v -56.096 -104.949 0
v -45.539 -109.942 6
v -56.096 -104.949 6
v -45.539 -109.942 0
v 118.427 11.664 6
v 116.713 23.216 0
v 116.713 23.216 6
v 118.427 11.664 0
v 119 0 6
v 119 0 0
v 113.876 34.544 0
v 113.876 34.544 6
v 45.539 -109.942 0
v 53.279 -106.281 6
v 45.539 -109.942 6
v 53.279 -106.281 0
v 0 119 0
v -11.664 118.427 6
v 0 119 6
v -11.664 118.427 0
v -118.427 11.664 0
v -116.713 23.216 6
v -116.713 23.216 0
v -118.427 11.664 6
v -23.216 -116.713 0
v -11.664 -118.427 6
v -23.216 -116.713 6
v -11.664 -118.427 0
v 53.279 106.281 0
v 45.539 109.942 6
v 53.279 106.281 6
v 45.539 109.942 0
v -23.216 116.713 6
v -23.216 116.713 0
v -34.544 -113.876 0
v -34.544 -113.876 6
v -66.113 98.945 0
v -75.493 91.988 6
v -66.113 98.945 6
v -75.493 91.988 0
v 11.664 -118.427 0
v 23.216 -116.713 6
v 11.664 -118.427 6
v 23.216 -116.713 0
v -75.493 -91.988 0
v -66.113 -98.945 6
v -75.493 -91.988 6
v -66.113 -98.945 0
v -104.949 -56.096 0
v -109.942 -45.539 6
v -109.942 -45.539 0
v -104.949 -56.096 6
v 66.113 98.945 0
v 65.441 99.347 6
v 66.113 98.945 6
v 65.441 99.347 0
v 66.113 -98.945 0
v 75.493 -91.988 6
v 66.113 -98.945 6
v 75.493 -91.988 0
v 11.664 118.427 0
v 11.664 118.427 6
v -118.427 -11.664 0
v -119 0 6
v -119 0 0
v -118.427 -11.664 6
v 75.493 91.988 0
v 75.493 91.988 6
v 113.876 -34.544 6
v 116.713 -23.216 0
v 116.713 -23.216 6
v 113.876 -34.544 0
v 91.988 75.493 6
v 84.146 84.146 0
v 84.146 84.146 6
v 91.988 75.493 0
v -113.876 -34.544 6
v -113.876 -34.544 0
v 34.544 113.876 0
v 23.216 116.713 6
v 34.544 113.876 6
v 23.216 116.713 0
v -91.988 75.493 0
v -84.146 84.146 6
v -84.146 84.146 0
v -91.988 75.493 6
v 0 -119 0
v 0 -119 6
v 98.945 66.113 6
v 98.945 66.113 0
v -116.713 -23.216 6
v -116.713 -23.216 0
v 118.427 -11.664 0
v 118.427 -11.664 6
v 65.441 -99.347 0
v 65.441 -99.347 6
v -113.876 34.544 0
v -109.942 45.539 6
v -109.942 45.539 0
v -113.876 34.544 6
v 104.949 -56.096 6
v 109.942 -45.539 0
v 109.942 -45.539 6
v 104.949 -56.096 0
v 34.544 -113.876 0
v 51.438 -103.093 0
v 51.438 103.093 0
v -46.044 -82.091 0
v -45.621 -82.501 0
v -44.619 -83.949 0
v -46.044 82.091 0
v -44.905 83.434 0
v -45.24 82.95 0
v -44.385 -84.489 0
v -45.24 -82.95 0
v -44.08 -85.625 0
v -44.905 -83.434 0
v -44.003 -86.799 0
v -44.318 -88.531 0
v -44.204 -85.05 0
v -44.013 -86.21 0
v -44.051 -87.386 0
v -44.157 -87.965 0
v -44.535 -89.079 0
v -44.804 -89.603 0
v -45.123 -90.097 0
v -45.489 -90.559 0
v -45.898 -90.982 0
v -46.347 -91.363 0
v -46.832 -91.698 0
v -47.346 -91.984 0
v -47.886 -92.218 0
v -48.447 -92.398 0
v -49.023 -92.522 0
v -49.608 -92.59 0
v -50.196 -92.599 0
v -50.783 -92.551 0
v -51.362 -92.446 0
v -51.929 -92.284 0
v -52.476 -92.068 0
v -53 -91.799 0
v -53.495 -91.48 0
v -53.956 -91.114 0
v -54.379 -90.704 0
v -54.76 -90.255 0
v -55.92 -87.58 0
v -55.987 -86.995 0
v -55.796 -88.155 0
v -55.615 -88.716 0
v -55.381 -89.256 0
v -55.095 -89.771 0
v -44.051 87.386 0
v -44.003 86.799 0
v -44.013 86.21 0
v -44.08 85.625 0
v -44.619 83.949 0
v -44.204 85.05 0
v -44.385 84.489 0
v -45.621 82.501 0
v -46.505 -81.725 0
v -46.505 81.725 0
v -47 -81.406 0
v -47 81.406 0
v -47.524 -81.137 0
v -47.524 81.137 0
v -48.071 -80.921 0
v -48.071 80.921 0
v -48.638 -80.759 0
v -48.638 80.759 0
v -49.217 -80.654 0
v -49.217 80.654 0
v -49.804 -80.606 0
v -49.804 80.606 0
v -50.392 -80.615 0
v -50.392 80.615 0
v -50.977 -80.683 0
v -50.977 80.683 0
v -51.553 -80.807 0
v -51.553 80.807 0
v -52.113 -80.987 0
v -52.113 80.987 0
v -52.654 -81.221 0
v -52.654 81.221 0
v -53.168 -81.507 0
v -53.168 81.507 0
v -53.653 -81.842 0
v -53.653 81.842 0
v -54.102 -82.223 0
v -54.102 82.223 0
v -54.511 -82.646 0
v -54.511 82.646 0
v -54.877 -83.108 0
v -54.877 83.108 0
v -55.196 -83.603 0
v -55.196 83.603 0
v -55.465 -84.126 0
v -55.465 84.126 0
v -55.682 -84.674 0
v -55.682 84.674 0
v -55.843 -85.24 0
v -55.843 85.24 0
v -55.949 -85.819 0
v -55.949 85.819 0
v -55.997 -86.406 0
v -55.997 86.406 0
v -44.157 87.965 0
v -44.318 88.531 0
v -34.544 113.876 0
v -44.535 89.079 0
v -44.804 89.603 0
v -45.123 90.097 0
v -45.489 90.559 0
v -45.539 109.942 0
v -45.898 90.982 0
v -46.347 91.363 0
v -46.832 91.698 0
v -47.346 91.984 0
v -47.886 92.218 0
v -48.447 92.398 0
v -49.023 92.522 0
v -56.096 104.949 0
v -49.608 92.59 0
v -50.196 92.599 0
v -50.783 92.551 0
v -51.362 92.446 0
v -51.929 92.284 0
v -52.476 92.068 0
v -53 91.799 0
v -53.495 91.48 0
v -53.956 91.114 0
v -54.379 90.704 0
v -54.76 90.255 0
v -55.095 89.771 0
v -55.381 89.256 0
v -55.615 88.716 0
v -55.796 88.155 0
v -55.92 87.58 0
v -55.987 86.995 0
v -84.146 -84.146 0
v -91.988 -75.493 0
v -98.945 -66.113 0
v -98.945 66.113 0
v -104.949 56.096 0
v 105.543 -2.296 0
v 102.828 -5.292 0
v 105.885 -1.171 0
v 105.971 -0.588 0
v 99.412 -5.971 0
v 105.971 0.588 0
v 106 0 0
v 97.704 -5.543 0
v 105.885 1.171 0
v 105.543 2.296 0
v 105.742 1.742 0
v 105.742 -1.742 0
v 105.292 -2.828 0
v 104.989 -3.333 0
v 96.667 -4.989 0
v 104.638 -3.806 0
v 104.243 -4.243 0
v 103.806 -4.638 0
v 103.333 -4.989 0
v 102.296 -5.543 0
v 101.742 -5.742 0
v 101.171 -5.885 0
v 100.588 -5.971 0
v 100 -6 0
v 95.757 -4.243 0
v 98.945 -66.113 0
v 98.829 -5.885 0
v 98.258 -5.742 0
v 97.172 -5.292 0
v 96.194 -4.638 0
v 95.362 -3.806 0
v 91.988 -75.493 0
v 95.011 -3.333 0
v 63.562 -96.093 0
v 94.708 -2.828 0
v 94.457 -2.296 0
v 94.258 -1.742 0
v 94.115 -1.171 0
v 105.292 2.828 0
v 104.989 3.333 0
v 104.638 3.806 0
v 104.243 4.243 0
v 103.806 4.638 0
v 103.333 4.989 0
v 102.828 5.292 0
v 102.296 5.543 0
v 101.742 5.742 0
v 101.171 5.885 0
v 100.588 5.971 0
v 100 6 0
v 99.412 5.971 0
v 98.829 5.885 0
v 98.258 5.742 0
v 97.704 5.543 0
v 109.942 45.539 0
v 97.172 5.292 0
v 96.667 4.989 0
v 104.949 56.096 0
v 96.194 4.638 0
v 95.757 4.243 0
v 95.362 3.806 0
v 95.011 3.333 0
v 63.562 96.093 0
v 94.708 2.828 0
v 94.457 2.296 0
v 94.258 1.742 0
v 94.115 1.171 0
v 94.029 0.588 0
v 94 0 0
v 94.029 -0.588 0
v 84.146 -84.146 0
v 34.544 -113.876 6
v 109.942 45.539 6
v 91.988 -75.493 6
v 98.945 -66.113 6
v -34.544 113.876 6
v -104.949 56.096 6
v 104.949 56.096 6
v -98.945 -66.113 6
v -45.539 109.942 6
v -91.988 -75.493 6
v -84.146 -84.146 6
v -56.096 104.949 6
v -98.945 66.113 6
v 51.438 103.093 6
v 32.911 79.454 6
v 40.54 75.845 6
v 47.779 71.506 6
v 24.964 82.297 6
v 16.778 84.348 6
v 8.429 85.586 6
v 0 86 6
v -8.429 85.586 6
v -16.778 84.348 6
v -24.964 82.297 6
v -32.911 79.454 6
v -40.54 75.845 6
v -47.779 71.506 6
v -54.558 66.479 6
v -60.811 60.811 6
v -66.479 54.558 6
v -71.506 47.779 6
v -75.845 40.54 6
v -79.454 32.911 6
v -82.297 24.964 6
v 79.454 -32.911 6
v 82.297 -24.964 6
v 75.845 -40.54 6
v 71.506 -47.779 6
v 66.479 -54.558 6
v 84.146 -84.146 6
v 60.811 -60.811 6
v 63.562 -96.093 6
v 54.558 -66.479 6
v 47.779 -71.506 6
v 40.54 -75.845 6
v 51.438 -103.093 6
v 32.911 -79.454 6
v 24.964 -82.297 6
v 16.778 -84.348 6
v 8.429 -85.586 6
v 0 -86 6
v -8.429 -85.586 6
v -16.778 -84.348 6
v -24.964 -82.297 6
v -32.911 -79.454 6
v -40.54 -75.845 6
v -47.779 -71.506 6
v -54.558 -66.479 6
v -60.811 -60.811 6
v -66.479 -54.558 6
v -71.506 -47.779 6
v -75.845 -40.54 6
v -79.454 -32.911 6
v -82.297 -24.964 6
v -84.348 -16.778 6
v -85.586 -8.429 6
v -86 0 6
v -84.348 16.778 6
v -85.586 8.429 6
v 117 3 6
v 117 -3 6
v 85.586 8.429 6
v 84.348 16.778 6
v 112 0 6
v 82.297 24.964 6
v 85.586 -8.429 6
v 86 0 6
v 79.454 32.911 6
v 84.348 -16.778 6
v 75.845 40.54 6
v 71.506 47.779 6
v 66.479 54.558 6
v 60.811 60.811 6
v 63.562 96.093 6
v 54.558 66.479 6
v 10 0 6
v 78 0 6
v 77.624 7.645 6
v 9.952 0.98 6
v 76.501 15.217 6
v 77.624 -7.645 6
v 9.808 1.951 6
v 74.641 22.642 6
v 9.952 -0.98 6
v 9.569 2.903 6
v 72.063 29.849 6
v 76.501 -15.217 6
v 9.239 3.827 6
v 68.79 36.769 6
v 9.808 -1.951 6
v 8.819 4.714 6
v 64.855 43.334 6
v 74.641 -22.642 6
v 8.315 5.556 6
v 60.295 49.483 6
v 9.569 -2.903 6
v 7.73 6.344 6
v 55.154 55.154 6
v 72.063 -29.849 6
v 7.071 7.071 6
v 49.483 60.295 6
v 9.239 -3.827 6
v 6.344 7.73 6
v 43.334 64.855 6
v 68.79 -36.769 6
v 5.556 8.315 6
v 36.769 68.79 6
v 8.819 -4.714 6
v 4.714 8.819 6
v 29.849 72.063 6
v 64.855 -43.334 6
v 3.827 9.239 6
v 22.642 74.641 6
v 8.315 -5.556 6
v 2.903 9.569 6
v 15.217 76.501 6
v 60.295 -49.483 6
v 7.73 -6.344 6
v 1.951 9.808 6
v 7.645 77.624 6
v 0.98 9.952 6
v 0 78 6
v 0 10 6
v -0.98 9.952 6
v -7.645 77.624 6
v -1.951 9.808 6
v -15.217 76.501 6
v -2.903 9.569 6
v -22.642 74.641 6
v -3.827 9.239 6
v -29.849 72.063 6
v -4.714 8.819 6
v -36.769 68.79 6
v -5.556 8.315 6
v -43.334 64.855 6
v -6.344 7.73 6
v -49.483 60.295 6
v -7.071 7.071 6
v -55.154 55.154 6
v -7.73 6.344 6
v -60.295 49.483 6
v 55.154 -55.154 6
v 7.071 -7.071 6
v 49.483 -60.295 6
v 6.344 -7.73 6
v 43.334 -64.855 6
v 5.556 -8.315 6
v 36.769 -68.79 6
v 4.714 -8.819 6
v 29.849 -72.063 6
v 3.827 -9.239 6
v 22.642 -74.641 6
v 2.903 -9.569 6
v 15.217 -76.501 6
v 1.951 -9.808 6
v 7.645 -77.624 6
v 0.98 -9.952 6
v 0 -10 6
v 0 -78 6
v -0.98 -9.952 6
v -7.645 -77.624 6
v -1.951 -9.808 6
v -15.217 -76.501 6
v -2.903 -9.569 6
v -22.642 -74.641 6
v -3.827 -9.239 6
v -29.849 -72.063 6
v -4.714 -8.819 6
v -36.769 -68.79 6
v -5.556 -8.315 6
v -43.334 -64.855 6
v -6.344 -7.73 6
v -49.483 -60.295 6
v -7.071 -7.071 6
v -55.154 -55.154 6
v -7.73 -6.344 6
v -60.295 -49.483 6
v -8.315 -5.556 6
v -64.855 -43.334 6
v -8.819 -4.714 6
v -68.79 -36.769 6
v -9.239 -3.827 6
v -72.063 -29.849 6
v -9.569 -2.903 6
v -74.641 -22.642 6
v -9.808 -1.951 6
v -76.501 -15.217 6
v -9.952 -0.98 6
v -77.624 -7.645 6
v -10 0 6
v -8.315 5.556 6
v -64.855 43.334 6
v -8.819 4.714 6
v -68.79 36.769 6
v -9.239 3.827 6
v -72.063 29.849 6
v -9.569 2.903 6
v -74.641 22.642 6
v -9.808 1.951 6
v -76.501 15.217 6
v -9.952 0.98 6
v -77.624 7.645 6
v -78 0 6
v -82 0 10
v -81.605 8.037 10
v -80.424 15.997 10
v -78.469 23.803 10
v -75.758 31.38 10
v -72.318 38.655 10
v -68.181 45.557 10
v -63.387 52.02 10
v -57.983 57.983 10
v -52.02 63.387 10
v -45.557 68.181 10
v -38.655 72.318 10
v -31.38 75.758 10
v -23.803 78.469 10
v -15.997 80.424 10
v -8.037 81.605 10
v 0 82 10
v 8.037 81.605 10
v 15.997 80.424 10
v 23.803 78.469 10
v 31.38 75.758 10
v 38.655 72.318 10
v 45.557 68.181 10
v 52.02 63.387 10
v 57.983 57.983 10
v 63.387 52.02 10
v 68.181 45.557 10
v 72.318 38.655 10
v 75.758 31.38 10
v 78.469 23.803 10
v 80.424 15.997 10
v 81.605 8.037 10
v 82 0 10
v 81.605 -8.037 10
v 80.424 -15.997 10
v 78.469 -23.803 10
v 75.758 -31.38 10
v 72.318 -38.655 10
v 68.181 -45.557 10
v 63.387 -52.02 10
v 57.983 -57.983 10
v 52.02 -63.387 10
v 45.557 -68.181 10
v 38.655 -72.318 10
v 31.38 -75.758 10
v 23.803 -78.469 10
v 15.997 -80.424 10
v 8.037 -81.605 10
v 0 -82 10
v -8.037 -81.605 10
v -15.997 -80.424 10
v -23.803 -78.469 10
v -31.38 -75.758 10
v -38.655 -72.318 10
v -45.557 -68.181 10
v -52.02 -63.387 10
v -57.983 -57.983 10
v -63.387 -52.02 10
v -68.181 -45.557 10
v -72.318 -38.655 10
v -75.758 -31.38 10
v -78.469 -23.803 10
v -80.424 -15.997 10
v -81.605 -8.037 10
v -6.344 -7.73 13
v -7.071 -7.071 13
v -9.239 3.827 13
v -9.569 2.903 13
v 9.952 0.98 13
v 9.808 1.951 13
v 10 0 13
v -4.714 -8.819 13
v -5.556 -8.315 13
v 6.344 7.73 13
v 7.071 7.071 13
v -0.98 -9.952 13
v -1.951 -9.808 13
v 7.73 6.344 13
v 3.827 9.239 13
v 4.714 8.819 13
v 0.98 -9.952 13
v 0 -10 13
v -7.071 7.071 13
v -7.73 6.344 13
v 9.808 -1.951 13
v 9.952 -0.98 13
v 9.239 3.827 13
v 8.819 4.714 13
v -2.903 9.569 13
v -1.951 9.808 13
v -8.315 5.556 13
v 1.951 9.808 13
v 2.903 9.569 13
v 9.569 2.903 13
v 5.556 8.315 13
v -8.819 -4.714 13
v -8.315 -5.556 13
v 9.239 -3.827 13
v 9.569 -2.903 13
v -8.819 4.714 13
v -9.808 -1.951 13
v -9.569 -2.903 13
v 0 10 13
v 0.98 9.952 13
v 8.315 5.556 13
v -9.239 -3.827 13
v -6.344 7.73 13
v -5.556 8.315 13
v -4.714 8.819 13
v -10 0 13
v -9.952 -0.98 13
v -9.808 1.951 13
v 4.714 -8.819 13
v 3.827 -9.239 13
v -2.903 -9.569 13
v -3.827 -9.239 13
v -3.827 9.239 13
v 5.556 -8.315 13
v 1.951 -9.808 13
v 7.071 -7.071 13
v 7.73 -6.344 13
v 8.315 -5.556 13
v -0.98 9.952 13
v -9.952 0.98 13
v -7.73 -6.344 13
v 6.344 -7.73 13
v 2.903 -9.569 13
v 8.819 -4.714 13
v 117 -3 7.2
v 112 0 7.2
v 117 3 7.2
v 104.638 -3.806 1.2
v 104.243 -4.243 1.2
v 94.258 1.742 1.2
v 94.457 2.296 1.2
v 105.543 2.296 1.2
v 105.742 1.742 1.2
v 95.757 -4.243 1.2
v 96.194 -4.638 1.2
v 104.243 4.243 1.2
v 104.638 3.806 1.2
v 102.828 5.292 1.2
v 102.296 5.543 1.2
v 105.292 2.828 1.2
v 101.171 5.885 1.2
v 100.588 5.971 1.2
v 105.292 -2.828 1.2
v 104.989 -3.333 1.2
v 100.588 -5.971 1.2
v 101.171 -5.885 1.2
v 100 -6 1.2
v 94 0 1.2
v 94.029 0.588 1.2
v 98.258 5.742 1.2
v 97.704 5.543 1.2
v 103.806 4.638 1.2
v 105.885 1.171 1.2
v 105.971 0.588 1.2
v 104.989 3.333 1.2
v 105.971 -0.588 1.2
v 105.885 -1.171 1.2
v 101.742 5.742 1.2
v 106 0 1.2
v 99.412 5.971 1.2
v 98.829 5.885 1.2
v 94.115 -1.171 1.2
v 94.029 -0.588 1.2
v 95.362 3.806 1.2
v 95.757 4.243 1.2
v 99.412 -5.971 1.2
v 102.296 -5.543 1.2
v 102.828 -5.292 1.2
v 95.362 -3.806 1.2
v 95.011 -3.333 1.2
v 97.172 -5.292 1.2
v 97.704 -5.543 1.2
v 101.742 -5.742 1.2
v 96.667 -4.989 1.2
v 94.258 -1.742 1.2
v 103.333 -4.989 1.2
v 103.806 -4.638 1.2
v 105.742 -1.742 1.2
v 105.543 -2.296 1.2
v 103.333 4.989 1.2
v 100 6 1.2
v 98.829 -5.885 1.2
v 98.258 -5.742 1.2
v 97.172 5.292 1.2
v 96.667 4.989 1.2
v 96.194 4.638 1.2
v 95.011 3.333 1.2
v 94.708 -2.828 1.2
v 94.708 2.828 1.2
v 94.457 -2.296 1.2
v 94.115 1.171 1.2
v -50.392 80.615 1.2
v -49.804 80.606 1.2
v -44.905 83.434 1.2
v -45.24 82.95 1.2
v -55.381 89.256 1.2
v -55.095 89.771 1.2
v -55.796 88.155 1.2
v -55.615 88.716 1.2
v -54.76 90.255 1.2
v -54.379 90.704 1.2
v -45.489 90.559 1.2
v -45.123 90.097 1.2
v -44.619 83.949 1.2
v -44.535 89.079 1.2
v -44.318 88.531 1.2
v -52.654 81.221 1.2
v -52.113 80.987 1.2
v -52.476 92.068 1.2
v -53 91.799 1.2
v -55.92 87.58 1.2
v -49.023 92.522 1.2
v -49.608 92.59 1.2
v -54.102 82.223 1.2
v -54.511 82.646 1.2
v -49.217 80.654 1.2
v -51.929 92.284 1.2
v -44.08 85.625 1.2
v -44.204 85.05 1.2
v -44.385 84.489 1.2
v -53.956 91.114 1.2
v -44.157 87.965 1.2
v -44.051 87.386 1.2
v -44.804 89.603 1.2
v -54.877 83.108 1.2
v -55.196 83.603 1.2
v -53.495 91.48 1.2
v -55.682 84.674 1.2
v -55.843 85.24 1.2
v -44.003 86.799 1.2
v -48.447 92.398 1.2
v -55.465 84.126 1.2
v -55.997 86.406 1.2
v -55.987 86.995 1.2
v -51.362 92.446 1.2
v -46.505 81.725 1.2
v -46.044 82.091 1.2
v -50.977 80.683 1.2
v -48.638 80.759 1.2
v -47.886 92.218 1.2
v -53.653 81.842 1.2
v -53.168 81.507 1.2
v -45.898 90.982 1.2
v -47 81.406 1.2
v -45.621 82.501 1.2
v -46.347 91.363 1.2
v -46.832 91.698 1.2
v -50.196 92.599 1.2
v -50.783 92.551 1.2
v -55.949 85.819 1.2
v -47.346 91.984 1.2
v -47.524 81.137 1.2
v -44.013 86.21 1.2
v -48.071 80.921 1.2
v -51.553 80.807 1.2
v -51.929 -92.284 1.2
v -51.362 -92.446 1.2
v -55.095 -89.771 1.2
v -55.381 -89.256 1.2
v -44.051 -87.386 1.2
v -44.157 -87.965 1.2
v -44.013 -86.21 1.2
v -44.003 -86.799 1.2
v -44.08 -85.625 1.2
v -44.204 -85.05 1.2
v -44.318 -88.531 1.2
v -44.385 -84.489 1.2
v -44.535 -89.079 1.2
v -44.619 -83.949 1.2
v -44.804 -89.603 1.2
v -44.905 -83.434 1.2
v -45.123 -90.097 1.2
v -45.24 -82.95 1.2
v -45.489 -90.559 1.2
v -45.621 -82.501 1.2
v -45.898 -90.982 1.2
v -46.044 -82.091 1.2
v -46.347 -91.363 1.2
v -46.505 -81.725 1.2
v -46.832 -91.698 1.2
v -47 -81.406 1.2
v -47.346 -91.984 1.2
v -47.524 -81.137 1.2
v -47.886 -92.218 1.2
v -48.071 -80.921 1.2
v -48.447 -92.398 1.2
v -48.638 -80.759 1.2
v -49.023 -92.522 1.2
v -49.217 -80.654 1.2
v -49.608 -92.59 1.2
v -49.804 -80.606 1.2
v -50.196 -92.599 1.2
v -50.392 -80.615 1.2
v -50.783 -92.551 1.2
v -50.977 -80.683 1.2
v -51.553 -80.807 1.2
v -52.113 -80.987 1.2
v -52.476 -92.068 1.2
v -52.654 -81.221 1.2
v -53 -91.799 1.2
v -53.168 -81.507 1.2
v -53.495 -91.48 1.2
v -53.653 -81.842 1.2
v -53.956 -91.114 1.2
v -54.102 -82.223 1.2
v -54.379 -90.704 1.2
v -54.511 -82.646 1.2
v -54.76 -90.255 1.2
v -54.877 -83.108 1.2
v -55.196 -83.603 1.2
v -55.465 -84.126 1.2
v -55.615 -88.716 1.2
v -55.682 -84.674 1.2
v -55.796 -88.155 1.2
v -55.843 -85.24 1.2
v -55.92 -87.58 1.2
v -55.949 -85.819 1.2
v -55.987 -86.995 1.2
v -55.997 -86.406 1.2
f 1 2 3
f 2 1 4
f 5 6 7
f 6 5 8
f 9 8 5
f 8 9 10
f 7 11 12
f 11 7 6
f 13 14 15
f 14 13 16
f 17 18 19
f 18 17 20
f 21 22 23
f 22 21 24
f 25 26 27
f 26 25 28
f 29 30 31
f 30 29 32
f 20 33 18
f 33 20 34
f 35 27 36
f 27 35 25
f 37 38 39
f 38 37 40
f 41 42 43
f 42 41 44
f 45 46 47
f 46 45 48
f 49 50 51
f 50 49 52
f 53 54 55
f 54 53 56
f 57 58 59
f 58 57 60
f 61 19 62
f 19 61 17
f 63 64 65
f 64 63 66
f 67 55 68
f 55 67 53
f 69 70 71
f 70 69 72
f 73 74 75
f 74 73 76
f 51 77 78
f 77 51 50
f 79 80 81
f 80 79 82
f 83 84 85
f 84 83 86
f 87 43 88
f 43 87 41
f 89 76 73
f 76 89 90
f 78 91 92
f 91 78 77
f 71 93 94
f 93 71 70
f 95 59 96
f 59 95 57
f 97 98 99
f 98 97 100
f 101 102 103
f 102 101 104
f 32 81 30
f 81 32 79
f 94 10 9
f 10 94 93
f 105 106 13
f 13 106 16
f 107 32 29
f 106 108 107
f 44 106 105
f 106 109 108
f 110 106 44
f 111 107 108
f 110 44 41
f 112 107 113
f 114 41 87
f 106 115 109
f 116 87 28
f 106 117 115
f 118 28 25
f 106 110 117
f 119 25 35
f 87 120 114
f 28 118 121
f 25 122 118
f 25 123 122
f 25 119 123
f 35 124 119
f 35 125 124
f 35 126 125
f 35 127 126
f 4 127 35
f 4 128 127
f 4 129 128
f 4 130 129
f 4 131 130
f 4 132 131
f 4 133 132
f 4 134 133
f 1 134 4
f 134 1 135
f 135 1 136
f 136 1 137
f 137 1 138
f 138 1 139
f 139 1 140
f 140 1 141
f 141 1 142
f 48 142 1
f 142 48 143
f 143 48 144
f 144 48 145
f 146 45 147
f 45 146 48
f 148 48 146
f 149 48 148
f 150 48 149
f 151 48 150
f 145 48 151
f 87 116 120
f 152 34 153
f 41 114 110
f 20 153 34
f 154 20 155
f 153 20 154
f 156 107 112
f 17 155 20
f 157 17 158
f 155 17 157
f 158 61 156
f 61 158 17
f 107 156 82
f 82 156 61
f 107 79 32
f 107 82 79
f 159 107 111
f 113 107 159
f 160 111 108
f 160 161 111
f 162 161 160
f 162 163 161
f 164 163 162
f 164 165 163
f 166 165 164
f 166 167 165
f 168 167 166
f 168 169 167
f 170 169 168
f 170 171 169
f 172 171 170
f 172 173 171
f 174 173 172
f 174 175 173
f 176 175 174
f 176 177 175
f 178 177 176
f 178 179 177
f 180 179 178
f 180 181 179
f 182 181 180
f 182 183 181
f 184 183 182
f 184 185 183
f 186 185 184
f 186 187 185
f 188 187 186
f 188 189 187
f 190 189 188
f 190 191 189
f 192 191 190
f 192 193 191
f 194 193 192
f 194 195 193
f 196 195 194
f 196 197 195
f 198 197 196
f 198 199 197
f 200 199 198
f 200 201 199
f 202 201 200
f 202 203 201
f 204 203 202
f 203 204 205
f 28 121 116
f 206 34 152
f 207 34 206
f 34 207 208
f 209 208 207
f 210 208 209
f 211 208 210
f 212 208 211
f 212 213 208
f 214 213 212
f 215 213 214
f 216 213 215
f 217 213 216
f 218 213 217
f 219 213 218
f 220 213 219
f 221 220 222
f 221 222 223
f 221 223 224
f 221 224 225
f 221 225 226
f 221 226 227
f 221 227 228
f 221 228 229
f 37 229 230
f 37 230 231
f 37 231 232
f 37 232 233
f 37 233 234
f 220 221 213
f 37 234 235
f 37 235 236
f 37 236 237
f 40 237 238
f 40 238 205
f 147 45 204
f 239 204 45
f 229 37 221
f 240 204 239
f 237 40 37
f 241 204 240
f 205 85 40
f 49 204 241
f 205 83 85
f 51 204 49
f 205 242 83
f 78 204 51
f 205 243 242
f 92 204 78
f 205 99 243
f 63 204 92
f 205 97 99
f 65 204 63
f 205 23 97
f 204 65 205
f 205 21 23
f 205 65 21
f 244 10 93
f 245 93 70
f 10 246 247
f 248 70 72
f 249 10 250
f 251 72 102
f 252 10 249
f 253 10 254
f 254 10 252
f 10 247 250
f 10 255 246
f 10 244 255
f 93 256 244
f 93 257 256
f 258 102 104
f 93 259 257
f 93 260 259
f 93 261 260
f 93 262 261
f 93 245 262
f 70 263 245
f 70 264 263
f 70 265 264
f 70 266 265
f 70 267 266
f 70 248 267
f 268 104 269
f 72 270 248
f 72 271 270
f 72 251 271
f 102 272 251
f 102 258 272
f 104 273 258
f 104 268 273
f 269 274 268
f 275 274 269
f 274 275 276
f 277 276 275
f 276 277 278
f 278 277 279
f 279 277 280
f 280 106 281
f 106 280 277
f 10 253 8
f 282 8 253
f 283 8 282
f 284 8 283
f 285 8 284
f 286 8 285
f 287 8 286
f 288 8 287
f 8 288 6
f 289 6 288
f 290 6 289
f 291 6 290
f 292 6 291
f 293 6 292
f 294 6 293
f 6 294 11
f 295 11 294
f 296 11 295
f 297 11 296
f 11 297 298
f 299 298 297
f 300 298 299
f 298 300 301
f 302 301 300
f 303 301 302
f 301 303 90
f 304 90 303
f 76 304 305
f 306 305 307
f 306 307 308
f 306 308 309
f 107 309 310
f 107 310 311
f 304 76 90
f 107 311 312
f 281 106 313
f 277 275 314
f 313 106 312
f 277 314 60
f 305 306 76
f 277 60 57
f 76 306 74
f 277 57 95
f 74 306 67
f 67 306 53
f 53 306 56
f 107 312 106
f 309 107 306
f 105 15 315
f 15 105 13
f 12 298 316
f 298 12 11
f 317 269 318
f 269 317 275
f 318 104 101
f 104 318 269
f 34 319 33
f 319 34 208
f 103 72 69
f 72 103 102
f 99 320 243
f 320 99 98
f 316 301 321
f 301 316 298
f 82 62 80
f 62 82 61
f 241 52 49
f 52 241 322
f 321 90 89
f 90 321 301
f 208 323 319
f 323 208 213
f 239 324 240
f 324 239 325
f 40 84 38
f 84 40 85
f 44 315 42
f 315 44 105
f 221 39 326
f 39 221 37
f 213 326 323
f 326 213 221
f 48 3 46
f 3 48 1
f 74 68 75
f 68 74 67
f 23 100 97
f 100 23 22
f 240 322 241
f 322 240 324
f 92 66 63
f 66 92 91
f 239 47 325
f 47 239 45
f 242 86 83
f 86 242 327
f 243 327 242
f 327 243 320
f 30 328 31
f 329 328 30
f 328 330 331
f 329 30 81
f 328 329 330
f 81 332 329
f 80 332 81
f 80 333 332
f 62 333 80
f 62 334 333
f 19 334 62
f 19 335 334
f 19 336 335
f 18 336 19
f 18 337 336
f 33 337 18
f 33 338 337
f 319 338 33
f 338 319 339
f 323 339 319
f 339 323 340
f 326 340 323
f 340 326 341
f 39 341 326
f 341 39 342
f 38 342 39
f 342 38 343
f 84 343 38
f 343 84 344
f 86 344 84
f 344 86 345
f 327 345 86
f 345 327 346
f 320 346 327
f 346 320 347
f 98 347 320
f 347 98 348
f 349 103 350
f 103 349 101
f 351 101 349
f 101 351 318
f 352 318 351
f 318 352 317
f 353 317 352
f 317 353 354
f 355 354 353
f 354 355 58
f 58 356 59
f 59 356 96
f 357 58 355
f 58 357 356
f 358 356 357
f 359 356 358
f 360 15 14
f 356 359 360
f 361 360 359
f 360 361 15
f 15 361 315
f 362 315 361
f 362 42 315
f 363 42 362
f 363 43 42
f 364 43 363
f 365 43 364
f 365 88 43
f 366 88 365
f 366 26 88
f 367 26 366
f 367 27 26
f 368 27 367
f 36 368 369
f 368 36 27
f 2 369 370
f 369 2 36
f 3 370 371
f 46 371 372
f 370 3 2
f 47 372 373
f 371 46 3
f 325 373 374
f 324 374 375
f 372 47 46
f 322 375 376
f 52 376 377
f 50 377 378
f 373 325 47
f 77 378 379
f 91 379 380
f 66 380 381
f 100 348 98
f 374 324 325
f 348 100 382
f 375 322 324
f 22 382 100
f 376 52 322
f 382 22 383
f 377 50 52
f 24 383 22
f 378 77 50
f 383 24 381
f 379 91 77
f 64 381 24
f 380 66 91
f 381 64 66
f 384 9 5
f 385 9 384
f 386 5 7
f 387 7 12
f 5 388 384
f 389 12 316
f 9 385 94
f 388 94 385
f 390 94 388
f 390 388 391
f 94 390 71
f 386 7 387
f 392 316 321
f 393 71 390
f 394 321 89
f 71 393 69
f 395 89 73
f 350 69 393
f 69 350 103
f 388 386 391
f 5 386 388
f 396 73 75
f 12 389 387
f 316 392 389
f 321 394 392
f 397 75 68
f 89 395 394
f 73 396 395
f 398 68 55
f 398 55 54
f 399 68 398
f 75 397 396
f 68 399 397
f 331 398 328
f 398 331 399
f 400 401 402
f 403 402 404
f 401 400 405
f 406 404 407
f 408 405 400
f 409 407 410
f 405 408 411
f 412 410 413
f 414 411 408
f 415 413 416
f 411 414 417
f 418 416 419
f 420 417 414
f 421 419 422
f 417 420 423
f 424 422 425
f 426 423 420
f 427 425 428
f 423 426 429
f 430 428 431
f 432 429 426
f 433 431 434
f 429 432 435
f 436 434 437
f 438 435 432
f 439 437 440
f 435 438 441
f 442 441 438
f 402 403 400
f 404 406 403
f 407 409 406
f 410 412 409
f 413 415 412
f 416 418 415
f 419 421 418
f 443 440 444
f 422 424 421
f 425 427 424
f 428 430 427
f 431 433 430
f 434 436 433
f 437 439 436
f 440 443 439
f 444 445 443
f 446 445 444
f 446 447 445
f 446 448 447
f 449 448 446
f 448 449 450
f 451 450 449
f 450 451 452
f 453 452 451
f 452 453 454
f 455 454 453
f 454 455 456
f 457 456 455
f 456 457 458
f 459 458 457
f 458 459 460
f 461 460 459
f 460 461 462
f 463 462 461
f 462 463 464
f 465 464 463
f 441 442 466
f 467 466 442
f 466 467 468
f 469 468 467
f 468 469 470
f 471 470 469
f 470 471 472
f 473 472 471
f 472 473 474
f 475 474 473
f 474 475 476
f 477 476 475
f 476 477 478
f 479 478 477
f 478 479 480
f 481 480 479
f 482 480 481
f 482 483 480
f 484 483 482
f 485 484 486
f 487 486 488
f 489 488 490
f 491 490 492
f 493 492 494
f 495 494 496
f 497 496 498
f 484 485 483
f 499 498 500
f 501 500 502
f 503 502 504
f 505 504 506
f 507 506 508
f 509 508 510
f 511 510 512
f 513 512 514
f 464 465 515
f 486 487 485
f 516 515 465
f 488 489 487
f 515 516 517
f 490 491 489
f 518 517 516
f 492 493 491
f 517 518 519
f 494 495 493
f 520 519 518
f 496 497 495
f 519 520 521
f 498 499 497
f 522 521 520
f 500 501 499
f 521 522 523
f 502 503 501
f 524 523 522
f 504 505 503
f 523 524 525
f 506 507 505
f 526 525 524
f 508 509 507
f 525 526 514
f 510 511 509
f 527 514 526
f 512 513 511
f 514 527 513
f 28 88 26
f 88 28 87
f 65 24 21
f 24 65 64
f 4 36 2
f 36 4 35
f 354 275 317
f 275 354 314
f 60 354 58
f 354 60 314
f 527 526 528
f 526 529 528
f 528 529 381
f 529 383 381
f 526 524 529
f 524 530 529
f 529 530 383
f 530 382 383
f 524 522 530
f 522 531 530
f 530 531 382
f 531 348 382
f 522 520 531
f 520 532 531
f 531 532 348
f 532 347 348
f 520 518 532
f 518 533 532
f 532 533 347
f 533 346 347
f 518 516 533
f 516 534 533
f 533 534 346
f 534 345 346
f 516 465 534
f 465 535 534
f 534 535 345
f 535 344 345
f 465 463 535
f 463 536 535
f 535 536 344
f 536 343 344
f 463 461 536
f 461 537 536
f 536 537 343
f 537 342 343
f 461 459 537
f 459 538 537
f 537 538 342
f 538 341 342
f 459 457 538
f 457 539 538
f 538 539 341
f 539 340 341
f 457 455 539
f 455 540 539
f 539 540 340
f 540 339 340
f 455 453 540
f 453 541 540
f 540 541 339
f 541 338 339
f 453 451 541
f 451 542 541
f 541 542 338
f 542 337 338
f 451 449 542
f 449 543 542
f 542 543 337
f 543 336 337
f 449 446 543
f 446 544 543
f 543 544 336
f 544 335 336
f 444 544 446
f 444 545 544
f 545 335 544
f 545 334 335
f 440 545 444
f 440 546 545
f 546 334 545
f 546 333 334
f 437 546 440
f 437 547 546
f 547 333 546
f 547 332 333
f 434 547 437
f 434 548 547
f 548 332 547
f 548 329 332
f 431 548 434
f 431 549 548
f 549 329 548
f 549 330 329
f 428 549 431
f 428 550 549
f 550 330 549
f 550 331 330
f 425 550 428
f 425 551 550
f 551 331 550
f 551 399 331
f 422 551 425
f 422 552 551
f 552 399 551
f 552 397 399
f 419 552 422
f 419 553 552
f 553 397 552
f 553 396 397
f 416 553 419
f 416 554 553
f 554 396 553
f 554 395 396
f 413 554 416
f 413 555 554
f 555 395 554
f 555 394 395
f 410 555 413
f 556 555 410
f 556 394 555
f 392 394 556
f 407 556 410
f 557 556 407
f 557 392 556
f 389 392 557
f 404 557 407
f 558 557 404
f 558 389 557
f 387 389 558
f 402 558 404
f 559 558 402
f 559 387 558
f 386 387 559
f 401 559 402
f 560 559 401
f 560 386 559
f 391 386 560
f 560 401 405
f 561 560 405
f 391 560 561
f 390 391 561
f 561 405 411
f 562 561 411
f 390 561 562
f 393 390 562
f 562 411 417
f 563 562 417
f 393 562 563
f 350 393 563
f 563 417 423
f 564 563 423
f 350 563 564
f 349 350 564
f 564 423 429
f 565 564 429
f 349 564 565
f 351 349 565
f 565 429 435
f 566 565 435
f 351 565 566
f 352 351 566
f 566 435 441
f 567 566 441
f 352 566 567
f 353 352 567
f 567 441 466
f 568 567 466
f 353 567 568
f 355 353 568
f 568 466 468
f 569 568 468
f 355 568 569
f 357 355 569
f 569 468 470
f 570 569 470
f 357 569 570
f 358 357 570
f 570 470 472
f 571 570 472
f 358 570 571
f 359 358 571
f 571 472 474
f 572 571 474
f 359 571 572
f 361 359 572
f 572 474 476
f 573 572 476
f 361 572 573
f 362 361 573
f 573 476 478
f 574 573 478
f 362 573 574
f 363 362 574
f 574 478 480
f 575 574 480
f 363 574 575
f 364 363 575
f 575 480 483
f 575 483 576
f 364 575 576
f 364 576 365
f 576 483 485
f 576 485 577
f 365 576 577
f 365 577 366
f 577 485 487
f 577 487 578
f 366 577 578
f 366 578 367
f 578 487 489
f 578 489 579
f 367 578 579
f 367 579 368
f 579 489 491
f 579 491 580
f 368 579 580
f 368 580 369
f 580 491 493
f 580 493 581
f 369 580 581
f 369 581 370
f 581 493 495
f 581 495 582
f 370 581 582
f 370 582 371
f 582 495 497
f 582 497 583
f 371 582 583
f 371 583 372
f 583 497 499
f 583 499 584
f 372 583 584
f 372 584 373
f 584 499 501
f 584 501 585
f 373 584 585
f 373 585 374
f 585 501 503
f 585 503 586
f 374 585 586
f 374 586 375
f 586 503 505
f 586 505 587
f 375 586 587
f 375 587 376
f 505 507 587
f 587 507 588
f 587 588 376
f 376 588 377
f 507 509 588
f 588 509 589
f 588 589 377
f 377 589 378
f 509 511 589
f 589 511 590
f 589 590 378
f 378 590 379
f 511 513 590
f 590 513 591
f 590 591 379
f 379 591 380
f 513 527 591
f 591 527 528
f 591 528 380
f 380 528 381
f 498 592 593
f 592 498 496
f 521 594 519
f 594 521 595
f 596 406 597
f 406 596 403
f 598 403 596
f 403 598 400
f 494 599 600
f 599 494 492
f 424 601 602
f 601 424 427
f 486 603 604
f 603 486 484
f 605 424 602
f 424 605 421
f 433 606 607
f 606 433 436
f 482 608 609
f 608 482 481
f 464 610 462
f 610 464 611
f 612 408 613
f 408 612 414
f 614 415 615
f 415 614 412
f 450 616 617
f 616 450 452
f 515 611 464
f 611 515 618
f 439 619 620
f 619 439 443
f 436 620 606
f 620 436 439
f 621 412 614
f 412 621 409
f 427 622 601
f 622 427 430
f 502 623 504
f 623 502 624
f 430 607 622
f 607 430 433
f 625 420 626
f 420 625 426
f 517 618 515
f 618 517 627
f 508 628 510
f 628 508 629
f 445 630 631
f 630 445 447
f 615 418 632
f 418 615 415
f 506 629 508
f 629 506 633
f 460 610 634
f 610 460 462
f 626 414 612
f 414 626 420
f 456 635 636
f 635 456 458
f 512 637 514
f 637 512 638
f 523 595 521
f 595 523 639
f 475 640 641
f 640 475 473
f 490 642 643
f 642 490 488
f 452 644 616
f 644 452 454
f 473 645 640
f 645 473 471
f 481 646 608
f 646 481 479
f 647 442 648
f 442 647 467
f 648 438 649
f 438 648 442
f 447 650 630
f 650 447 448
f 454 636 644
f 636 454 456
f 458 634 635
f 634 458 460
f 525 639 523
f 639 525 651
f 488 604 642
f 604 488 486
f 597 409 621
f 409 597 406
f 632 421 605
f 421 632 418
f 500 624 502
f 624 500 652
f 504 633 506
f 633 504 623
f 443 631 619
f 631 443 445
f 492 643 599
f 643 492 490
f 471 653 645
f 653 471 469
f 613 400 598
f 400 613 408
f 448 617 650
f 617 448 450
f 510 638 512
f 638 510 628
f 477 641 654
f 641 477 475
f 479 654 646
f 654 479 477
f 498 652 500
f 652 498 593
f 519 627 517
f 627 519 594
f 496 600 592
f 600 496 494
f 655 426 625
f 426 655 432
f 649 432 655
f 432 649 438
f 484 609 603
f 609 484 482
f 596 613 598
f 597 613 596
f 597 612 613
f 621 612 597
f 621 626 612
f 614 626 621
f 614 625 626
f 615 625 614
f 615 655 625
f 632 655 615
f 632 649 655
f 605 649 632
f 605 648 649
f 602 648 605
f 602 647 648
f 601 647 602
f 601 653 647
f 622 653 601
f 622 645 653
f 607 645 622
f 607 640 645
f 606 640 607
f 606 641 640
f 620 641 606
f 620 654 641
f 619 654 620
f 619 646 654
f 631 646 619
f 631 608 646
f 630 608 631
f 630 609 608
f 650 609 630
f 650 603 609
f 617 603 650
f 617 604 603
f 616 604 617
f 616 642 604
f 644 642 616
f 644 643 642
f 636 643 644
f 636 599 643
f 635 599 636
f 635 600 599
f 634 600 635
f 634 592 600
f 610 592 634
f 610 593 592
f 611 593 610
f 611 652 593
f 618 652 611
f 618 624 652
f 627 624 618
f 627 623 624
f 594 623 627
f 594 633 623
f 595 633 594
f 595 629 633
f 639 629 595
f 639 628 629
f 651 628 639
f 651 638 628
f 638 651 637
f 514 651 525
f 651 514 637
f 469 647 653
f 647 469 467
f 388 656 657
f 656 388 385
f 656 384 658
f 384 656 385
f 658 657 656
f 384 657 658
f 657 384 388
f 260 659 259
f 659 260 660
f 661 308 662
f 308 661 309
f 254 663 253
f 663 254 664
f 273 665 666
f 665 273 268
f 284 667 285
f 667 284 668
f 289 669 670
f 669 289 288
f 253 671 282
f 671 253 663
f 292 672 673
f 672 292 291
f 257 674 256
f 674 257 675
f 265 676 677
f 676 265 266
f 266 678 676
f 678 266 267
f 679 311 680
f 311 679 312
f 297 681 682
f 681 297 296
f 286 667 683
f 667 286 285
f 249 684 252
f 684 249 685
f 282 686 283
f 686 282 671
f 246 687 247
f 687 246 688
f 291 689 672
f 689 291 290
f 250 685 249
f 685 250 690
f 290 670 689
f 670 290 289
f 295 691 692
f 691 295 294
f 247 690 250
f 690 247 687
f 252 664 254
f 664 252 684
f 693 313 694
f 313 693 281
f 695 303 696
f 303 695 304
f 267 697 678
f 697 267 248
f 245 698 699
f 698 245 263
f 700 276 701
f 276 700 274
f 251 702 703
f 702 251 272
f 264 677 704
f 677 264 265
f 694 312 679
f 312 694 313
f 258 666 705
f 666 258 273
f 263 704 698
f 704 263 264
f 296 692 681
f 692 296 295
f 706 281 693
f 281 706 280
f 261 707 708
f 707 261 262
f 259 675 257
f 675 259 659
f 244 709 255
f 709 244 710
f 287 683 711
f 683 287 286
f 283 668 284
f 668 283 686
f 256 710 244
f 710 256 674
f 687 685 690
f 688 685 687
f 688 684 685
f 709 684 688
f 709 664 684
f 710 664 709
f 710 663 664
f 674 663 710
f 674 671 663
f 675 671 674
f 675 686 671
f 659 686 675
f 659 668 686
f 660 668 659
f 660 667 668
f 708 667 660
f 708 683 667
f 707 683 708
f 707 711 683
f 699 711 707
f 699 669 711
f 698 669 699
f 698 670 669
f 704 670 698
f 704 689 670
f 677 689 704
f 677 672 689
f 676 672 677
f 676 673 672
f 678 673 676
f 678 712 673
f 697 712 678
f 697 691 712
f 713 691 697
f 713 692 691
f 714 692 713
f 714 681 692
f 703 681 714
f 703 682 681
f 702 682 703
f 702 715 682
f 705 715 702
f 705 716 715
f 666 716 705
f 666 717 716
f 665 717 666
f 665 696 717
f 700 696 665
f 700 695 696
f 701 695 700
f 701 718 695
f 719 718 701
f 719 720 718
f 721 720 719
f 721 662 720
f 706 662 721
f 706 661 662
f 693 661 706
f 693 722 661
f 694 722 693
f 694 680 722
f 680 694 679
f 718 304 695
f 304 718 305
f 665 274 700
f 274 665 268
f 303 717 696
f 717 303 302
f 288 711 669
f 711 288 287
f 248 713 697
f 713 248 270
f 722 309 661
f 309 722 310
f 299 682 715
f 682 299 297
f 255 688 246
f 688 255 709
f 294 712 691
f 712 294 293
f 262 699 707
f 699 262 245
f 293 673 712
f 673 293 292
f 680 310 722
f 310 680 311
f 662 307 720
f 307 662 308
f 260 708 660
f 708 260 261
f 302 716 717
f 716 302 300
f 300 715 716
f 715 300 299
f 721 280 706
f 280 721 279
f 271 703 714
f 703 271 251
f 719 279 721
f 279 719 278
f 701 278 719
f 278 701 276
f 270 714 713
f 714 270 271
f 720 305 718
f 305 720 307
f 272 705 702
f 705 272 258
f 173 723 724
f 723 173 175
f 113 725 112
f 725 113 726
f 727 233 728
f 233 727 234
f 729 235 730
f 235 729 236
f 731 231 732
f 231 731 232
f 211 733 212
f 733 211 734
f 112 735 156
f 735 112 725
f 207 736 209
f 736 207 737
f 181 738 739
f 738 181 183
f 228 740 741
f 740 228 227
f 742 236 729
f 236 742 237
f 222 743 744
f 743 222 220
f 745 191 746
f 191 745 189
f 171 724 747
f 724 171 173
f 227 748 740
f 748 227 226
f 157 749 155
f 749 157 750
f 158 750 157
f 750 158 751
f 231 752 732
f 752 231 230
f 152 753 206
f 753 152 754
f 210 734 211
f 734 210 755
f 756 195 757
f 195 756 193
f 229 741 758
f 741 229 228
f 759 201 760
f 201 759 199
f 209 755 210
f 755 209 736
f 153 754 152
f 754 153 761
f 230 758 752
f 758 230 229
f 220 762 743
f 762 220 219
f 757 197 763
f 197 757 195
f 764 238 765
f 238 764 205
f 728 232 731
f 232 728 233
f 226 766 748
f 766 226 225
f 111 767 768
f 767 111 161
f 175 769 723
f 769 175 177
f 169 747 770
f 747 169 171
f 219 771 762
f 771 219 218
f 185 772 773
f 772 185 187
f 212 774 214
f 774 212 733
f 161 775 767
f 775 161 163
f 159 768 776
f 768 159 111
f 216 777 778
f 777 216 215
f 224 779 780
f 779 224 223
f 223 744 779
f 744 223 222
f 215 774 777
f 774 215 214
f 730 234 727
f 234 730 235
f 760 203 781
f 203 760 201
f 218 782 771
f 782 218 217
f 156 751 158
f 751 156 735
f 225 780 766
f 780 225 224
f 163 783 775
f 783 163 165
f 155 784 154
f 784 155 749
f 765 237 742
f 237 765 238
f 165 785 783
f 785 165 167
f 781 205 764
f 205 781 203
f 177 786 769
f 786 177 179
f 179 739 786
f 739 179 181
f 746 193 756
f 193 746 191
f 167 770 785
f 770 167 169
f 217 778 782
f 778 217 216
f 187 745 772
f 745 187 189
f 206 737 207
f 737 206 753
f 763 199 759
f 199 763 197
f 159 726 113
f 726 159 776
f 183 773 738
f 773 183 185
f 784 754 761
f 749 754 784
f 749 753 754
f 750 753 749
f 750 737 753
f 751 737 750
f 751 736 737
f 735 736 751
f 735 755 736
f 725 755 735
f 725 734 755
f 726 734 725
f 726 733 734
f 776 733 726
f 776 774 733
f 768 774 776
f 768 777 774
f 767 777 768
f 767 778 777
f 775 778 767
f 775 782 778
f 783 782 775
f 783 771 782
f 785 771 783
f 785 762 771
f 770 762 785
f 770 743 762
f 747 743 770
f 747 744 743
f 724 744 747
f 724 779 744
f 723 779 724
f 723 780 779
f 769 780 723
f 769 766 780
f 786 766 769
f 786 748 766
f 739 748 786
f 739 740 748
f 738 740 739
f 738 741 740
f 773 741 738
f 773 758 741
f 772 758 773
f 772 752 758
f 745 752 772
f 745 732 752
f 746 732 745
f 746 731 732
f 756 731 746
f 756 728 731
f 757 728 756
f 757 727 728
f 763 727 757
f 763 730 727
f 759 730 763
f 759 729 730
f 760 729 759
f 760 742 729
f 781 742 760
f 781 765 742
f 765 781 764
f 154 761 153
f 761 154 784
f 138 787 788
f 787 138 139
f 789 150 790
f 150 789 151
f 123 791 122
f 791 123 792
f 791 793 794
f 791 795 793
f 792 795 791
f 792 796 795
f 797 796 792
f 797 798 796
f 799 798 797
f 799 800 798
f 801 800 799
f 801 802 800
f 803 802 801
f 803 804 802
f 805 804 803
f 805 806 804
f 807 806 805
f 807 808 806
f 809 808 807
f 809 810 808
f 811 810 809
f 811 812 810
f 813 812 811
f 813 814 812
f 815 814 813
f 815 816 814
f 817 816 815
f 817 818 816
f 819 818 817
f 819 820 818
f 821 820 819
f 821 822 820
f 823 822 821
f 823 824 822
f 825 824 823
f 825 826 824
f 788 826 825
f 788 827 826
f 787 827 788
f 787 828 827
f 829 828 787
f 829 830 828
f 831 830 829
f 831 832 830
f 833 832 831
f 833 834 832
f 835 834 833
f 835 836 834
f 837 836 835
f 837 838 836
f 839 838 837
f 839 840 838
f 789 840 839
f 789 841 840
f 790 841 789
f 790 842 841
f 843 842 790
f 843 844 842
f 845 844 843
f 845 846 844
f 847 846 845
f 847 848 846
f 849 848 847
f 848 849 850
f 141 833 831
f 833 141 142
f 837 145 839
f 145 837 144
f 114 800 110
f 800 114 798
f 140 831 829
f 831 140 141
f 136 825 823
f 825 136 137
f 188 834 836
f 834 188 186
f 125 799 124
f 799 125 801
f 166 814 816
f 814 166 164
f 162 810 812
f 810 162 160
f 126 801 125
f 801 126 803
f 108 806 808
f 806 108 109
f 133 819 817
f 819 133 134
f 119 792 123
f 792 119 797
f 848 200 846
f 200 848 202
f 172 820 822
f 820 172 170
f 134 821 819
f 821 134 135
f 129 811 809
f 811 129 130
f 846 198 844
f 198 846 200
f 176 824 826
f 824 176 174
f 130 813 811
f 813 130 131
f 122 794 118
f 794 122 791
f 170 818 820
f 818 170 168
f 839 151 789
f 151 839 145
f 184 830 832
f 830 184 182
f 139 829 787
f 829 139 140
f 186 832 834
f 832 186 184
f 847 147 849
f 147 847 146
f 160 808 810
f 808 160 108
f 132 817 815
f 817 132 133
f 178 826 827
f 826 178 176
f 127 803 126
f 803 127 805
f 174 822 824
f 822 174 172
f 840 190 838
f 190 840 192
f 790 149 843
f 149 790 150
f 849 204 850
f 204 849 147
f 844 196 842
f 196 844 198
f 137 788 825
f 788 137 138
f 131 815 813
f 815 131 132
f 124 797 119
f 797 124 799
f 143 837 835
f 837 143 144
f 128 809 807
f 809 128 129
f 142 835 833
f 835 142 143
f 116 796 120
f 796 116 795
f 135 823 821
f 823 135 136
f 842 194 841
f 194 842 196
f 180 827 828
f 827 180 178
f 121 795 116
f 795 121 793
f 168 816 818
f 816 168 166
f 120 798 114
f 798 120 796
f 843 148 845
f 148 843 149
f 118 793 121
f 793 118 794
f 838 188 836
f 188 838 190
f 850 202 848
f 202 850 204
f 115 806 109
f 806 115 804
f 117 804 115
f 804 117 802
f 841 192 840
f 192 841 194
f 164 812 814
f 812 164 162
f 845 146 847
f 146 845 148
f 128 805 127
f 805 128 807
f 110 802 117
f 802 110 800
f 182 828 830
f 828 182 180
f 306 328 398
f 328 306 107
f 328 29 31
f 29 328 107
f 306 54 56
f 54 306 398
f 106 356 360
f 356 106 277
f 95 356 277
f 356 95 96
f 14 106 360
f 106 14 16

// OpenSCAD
// Scanning Rig - Turntable base (V-race ring + centring spindle)
// Render this file to generate turntable_base.stl

include <_scanning_rig.scad>

turntable_base();
